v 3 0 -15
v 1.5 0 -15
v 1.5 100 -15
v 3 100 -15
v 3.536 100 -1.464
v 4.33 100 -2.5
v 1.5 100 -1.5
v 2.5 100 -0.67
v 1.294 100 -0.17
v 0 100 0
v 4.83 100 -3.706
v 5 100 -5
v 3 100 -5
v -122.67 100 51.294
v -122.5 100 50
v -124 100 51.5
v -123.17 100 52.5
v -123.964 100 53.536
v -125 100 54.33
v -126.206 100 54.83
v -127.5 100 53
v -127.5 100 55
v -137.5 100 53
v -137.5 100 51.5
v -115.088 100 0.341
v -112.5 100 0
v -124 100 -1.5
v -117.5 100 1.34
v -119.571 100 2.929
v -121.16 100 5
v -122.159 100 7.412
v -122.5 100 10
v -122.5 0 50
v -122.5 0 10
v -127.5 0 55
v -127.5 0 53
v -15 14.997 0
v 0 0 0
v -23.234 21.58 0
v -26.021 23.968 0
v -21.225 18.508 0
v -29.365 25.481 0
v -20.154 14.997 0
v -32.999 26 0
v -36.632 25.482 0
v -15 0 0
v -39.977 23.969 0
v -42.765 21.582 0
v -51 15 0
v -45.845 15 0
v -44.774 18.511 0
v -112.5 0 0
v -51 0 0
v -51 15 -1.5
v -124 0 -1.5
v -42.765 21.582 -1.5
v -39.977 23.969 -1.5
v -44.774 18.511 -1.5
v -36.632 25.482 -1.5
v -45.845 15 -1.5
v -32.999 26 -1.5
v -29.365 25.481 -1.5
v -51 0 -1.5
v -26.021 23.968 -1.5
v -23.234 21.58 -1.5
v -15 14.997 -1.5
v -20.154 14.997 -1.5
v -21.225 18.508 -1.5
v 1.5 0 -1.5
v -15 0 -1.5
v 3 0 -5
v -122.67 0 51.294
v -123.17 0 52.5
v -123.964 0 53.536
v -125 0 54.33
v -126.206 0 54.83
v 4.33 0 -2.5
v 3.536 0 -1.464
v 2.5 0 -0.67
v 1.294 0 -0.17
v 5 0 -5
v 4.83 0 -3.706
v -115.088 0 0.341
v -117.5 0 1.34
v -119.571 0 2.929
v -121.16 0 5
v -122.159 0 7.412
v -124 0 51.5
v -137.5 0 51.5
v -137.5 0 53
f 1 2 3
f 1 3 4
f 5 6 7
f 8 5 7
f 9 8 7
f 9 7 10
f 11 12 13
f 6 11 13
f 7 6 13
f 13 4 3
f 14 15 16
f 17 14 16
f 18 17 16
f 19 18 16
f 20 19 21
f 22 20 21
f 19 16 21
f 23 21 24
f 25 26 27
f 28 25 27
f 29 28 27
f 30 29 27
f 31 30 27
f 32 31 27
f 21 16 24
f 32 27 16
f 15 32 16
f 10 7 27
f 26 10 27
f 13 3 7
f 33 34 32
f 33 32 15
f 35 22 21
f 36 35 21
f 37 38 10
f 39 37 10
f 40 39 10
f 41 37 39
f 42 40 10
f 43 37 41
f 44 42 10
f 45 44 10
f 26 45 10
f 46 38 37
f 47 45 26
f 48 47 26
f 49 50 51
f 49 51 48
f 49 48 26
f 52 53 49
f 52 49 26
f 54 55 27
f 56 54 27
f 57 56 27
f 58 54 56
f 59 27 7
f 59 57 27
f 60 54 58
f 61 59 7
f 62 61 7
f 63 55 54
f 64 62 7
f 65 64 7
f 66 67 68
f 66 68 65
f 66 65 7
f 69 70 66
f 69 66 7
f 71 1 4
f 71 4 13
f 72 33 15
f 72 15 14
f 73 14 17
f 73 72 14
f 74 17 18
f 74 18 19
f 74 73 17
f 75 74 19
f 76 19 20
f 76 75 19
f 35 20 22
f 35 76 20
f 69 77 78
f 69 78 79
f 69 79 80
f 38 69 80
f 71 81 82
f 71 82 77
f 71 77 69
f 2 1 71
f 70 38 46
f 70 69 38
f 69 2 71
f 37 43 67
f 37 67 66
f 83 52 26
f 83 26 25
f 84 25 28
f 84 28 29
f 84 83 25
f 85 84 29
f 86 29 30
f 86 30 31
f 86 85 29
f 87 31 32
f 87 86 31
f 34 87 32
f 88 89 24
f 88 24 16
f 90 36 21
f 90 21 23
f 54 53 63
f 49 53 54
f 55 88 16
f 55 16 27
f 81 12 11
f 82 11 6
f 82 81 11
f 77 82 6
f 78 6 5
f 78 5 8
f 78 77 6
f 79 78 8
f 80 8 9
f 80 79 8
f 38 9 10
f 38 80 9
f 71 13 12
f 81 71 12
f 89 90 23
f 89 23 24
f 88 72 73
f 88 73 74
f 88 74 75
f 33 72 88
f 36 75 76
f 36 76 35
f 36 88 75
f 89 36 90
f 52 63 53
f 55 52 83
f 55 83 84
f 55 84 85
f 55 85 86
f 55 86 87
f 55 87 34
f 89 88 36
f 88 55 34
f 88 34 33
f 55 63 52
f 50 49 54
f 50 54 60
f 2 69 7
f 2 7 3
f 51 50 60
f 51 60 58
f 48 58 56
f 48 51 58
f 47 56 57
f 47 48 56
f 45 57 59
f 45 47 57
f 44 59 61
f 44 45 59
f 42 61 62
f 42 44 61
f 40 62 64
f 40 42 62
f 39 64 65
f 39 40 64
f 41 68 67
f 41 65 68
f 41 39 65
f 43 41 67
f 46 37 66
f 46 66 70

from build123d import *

# Parameters (mm, degrees)
EXTRUDE_1_DEPTH     = 100
CUT_EXTRUDE_1_DEPTH = 16


with BuildPart() as part:
    # Эскиз1 → Бобышка-Вытянуть1 (new body)
    with BuildSketch(Plane(origin=(0, 0, 0), x_dir=(1, 0, 0), z_dir=(0, 1, 0))):
        with BuildLine():
            Line((0, 0), (-112.5, 0))
            ThreePointArc((-112.5, 0), (-119.571067812, -2.928932188), (-122.5, -10))
            Line((-122.5, -10), (-122.5, -50))
            ThreePointArc((-122.5, -50), (-123.964466094, -53.535533906), (-127.5, -55))
            Line((-127.5, -55), (-127.5, -53))
            Line((-127.5, -53), (-137.5, -53))
            Line((-137.5, -53), (-137.5, -51.5))
            Line((-137.5, -51.5), (-124, -51.5))
            Line((-124, -51.5), (-124, 1.5))
            Line((-124, 1.5), (1.5, 1.5))
            Line((1.5, 1.5), (1.5, 15))
            Line((1.5, 15), (3, 15))
            Line((3, 15), (3, 5))
            Line((3, 5), (5, 5))
            ThreePointArc((5, 5), (3.535533906, 1.464466094), (0, 0))
        make_face()
    extrude(amount=EXTRUDE_1_DEPTH)

    # Эскиз4 → Вырез-Вытянуть1 (cut, through all)
    with BuildSketch(Plane.XY):
        with BuildLine():
            Line((-15, 0), (-51, 0))
            Line((-51, 0), (-51, 15))
            Line((-51, 15), (-45.845232579, 15))
            ThreePointArc((-45.845232579, 15), (-32.998579553, 25.999999922), (-20.154330668, 14.997192881))
            Line((-20.154330668, 14.997192881), (-15, 14.997192881))
            Line((-15, 14.997192881), (-15, 0))
        make_face()
    extrude(amount=-CUT_EXTRUDE_1_DEPTH, mode=Mode.SUBTRACT)


solid = part.part
